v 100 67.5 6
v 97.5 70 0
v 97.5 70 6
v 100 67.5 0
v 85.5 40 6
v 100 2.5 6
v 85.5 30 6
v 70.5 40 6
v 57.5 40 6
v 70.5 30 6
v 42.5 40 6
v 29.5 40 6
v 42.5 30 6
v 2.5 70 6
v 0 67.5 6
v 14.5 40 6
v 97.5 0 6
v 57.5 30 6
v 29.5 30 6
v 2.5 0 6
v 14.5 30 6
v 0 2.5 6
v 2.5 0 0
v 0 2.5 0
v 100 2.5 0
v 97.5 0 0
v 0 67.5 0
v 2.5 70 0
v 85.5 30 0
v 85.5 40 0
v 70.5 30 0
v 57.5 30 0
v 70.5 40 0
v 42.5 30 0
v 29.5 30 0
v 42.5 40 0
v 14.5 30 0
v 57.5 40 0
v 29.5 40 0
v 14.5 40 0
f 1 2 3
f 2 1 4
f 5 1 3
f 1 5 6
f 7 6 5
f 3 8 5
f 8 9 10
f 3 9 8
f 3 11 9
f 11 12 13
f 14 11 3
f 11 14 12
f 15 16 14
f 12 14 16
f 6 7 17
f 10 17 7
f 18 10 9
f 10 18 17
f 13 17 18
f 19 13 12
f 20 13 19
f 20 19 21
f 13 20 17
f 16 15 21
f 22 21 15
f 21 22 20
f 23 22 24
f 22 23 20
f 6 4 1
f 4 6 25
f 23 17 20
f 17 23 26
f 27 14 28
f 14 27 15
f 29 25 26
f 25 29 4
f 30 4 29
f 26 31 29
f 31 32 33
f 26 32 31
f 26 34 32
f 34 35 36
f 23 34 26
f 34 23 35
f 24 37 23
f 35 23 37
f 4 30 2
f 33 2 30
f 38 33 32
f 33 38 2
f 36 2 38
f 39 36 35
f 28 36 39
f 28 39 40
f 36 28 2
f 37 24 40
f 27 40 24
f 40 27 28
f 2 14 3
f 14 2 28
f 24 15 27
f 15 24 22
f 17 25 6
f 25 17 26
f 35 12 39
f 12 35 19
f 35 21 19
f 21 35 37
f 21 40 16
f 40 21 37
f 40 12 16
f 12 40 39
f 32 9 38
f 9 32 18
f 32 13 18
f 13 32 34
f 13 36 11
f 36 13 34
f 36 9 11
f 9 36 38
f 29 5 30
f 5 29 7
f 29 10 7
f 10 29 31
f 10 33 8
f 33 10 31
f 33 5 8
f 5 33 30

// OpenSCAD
$fn = 32;

// ----------------------------------------------------------------------
// Windowed plate: 3 voids, 100 x 70 x 6 mm
// ----------------------------------------------------------------------

// --- parameters (mm) ---
plate_l = 100;            // plate length, X
plate_w = 70;             // plate width, Y
plate_t = 6;              // plate thickness, Z
edge_margin = 8;          // wall from the plate edge to any window
windows = 3;              // number of windows in the row
win_l = 15;               // window length
win_w = 10;               // window width
win_pitch = 28;           // window pitch along X
depth_1 = 6;              // depth of void 1 (full thickness = through)
depth_2 = 6;              // depth of void 2 (full thickness = through)
depth_3 = 6;              // depth of void 3 (full thickness = through)
corner_c = 2.5;           // corner chamfer of the plate

profile = [[2.5, 0], [97.5, 0], [100, 2.5], [100, 67.5], [97.5, 70], [2.5, 70], [0, 67.5], [0, 2.5]];  // primary outline, 8 points, counter clockwise
void_1 = [[14.5, 30], [29.5, 30], [29.5, 40], [14.5, 40]];  // window 1 of the row, 4 points
void_2 = [[42.5, 30], [57.5, 30], [57.5, 40], [42.5, 40]];  // window 2 of the row, 4 points
void_3 = [[70.5, 30], [85.5, 30], [85.5, 40], [70.5, 40]];  // window 3 of the row, 4 points

// --- the one profile operation ---
difference() {
  linear_extrude(height = plate_t) polygon(points = profile);
  translate([0, 0, -1])
    linear_extrude(height = plate_t + 2) polygon(points = void_1);
  translate([0, 0, -1])
    linear_extrude(height = plate_t + 2) polygon(points = void_2);
  translate([0, 0, -1])
    linear_extrude(height = plate_t + 2) polygon(points = void_3);
}
